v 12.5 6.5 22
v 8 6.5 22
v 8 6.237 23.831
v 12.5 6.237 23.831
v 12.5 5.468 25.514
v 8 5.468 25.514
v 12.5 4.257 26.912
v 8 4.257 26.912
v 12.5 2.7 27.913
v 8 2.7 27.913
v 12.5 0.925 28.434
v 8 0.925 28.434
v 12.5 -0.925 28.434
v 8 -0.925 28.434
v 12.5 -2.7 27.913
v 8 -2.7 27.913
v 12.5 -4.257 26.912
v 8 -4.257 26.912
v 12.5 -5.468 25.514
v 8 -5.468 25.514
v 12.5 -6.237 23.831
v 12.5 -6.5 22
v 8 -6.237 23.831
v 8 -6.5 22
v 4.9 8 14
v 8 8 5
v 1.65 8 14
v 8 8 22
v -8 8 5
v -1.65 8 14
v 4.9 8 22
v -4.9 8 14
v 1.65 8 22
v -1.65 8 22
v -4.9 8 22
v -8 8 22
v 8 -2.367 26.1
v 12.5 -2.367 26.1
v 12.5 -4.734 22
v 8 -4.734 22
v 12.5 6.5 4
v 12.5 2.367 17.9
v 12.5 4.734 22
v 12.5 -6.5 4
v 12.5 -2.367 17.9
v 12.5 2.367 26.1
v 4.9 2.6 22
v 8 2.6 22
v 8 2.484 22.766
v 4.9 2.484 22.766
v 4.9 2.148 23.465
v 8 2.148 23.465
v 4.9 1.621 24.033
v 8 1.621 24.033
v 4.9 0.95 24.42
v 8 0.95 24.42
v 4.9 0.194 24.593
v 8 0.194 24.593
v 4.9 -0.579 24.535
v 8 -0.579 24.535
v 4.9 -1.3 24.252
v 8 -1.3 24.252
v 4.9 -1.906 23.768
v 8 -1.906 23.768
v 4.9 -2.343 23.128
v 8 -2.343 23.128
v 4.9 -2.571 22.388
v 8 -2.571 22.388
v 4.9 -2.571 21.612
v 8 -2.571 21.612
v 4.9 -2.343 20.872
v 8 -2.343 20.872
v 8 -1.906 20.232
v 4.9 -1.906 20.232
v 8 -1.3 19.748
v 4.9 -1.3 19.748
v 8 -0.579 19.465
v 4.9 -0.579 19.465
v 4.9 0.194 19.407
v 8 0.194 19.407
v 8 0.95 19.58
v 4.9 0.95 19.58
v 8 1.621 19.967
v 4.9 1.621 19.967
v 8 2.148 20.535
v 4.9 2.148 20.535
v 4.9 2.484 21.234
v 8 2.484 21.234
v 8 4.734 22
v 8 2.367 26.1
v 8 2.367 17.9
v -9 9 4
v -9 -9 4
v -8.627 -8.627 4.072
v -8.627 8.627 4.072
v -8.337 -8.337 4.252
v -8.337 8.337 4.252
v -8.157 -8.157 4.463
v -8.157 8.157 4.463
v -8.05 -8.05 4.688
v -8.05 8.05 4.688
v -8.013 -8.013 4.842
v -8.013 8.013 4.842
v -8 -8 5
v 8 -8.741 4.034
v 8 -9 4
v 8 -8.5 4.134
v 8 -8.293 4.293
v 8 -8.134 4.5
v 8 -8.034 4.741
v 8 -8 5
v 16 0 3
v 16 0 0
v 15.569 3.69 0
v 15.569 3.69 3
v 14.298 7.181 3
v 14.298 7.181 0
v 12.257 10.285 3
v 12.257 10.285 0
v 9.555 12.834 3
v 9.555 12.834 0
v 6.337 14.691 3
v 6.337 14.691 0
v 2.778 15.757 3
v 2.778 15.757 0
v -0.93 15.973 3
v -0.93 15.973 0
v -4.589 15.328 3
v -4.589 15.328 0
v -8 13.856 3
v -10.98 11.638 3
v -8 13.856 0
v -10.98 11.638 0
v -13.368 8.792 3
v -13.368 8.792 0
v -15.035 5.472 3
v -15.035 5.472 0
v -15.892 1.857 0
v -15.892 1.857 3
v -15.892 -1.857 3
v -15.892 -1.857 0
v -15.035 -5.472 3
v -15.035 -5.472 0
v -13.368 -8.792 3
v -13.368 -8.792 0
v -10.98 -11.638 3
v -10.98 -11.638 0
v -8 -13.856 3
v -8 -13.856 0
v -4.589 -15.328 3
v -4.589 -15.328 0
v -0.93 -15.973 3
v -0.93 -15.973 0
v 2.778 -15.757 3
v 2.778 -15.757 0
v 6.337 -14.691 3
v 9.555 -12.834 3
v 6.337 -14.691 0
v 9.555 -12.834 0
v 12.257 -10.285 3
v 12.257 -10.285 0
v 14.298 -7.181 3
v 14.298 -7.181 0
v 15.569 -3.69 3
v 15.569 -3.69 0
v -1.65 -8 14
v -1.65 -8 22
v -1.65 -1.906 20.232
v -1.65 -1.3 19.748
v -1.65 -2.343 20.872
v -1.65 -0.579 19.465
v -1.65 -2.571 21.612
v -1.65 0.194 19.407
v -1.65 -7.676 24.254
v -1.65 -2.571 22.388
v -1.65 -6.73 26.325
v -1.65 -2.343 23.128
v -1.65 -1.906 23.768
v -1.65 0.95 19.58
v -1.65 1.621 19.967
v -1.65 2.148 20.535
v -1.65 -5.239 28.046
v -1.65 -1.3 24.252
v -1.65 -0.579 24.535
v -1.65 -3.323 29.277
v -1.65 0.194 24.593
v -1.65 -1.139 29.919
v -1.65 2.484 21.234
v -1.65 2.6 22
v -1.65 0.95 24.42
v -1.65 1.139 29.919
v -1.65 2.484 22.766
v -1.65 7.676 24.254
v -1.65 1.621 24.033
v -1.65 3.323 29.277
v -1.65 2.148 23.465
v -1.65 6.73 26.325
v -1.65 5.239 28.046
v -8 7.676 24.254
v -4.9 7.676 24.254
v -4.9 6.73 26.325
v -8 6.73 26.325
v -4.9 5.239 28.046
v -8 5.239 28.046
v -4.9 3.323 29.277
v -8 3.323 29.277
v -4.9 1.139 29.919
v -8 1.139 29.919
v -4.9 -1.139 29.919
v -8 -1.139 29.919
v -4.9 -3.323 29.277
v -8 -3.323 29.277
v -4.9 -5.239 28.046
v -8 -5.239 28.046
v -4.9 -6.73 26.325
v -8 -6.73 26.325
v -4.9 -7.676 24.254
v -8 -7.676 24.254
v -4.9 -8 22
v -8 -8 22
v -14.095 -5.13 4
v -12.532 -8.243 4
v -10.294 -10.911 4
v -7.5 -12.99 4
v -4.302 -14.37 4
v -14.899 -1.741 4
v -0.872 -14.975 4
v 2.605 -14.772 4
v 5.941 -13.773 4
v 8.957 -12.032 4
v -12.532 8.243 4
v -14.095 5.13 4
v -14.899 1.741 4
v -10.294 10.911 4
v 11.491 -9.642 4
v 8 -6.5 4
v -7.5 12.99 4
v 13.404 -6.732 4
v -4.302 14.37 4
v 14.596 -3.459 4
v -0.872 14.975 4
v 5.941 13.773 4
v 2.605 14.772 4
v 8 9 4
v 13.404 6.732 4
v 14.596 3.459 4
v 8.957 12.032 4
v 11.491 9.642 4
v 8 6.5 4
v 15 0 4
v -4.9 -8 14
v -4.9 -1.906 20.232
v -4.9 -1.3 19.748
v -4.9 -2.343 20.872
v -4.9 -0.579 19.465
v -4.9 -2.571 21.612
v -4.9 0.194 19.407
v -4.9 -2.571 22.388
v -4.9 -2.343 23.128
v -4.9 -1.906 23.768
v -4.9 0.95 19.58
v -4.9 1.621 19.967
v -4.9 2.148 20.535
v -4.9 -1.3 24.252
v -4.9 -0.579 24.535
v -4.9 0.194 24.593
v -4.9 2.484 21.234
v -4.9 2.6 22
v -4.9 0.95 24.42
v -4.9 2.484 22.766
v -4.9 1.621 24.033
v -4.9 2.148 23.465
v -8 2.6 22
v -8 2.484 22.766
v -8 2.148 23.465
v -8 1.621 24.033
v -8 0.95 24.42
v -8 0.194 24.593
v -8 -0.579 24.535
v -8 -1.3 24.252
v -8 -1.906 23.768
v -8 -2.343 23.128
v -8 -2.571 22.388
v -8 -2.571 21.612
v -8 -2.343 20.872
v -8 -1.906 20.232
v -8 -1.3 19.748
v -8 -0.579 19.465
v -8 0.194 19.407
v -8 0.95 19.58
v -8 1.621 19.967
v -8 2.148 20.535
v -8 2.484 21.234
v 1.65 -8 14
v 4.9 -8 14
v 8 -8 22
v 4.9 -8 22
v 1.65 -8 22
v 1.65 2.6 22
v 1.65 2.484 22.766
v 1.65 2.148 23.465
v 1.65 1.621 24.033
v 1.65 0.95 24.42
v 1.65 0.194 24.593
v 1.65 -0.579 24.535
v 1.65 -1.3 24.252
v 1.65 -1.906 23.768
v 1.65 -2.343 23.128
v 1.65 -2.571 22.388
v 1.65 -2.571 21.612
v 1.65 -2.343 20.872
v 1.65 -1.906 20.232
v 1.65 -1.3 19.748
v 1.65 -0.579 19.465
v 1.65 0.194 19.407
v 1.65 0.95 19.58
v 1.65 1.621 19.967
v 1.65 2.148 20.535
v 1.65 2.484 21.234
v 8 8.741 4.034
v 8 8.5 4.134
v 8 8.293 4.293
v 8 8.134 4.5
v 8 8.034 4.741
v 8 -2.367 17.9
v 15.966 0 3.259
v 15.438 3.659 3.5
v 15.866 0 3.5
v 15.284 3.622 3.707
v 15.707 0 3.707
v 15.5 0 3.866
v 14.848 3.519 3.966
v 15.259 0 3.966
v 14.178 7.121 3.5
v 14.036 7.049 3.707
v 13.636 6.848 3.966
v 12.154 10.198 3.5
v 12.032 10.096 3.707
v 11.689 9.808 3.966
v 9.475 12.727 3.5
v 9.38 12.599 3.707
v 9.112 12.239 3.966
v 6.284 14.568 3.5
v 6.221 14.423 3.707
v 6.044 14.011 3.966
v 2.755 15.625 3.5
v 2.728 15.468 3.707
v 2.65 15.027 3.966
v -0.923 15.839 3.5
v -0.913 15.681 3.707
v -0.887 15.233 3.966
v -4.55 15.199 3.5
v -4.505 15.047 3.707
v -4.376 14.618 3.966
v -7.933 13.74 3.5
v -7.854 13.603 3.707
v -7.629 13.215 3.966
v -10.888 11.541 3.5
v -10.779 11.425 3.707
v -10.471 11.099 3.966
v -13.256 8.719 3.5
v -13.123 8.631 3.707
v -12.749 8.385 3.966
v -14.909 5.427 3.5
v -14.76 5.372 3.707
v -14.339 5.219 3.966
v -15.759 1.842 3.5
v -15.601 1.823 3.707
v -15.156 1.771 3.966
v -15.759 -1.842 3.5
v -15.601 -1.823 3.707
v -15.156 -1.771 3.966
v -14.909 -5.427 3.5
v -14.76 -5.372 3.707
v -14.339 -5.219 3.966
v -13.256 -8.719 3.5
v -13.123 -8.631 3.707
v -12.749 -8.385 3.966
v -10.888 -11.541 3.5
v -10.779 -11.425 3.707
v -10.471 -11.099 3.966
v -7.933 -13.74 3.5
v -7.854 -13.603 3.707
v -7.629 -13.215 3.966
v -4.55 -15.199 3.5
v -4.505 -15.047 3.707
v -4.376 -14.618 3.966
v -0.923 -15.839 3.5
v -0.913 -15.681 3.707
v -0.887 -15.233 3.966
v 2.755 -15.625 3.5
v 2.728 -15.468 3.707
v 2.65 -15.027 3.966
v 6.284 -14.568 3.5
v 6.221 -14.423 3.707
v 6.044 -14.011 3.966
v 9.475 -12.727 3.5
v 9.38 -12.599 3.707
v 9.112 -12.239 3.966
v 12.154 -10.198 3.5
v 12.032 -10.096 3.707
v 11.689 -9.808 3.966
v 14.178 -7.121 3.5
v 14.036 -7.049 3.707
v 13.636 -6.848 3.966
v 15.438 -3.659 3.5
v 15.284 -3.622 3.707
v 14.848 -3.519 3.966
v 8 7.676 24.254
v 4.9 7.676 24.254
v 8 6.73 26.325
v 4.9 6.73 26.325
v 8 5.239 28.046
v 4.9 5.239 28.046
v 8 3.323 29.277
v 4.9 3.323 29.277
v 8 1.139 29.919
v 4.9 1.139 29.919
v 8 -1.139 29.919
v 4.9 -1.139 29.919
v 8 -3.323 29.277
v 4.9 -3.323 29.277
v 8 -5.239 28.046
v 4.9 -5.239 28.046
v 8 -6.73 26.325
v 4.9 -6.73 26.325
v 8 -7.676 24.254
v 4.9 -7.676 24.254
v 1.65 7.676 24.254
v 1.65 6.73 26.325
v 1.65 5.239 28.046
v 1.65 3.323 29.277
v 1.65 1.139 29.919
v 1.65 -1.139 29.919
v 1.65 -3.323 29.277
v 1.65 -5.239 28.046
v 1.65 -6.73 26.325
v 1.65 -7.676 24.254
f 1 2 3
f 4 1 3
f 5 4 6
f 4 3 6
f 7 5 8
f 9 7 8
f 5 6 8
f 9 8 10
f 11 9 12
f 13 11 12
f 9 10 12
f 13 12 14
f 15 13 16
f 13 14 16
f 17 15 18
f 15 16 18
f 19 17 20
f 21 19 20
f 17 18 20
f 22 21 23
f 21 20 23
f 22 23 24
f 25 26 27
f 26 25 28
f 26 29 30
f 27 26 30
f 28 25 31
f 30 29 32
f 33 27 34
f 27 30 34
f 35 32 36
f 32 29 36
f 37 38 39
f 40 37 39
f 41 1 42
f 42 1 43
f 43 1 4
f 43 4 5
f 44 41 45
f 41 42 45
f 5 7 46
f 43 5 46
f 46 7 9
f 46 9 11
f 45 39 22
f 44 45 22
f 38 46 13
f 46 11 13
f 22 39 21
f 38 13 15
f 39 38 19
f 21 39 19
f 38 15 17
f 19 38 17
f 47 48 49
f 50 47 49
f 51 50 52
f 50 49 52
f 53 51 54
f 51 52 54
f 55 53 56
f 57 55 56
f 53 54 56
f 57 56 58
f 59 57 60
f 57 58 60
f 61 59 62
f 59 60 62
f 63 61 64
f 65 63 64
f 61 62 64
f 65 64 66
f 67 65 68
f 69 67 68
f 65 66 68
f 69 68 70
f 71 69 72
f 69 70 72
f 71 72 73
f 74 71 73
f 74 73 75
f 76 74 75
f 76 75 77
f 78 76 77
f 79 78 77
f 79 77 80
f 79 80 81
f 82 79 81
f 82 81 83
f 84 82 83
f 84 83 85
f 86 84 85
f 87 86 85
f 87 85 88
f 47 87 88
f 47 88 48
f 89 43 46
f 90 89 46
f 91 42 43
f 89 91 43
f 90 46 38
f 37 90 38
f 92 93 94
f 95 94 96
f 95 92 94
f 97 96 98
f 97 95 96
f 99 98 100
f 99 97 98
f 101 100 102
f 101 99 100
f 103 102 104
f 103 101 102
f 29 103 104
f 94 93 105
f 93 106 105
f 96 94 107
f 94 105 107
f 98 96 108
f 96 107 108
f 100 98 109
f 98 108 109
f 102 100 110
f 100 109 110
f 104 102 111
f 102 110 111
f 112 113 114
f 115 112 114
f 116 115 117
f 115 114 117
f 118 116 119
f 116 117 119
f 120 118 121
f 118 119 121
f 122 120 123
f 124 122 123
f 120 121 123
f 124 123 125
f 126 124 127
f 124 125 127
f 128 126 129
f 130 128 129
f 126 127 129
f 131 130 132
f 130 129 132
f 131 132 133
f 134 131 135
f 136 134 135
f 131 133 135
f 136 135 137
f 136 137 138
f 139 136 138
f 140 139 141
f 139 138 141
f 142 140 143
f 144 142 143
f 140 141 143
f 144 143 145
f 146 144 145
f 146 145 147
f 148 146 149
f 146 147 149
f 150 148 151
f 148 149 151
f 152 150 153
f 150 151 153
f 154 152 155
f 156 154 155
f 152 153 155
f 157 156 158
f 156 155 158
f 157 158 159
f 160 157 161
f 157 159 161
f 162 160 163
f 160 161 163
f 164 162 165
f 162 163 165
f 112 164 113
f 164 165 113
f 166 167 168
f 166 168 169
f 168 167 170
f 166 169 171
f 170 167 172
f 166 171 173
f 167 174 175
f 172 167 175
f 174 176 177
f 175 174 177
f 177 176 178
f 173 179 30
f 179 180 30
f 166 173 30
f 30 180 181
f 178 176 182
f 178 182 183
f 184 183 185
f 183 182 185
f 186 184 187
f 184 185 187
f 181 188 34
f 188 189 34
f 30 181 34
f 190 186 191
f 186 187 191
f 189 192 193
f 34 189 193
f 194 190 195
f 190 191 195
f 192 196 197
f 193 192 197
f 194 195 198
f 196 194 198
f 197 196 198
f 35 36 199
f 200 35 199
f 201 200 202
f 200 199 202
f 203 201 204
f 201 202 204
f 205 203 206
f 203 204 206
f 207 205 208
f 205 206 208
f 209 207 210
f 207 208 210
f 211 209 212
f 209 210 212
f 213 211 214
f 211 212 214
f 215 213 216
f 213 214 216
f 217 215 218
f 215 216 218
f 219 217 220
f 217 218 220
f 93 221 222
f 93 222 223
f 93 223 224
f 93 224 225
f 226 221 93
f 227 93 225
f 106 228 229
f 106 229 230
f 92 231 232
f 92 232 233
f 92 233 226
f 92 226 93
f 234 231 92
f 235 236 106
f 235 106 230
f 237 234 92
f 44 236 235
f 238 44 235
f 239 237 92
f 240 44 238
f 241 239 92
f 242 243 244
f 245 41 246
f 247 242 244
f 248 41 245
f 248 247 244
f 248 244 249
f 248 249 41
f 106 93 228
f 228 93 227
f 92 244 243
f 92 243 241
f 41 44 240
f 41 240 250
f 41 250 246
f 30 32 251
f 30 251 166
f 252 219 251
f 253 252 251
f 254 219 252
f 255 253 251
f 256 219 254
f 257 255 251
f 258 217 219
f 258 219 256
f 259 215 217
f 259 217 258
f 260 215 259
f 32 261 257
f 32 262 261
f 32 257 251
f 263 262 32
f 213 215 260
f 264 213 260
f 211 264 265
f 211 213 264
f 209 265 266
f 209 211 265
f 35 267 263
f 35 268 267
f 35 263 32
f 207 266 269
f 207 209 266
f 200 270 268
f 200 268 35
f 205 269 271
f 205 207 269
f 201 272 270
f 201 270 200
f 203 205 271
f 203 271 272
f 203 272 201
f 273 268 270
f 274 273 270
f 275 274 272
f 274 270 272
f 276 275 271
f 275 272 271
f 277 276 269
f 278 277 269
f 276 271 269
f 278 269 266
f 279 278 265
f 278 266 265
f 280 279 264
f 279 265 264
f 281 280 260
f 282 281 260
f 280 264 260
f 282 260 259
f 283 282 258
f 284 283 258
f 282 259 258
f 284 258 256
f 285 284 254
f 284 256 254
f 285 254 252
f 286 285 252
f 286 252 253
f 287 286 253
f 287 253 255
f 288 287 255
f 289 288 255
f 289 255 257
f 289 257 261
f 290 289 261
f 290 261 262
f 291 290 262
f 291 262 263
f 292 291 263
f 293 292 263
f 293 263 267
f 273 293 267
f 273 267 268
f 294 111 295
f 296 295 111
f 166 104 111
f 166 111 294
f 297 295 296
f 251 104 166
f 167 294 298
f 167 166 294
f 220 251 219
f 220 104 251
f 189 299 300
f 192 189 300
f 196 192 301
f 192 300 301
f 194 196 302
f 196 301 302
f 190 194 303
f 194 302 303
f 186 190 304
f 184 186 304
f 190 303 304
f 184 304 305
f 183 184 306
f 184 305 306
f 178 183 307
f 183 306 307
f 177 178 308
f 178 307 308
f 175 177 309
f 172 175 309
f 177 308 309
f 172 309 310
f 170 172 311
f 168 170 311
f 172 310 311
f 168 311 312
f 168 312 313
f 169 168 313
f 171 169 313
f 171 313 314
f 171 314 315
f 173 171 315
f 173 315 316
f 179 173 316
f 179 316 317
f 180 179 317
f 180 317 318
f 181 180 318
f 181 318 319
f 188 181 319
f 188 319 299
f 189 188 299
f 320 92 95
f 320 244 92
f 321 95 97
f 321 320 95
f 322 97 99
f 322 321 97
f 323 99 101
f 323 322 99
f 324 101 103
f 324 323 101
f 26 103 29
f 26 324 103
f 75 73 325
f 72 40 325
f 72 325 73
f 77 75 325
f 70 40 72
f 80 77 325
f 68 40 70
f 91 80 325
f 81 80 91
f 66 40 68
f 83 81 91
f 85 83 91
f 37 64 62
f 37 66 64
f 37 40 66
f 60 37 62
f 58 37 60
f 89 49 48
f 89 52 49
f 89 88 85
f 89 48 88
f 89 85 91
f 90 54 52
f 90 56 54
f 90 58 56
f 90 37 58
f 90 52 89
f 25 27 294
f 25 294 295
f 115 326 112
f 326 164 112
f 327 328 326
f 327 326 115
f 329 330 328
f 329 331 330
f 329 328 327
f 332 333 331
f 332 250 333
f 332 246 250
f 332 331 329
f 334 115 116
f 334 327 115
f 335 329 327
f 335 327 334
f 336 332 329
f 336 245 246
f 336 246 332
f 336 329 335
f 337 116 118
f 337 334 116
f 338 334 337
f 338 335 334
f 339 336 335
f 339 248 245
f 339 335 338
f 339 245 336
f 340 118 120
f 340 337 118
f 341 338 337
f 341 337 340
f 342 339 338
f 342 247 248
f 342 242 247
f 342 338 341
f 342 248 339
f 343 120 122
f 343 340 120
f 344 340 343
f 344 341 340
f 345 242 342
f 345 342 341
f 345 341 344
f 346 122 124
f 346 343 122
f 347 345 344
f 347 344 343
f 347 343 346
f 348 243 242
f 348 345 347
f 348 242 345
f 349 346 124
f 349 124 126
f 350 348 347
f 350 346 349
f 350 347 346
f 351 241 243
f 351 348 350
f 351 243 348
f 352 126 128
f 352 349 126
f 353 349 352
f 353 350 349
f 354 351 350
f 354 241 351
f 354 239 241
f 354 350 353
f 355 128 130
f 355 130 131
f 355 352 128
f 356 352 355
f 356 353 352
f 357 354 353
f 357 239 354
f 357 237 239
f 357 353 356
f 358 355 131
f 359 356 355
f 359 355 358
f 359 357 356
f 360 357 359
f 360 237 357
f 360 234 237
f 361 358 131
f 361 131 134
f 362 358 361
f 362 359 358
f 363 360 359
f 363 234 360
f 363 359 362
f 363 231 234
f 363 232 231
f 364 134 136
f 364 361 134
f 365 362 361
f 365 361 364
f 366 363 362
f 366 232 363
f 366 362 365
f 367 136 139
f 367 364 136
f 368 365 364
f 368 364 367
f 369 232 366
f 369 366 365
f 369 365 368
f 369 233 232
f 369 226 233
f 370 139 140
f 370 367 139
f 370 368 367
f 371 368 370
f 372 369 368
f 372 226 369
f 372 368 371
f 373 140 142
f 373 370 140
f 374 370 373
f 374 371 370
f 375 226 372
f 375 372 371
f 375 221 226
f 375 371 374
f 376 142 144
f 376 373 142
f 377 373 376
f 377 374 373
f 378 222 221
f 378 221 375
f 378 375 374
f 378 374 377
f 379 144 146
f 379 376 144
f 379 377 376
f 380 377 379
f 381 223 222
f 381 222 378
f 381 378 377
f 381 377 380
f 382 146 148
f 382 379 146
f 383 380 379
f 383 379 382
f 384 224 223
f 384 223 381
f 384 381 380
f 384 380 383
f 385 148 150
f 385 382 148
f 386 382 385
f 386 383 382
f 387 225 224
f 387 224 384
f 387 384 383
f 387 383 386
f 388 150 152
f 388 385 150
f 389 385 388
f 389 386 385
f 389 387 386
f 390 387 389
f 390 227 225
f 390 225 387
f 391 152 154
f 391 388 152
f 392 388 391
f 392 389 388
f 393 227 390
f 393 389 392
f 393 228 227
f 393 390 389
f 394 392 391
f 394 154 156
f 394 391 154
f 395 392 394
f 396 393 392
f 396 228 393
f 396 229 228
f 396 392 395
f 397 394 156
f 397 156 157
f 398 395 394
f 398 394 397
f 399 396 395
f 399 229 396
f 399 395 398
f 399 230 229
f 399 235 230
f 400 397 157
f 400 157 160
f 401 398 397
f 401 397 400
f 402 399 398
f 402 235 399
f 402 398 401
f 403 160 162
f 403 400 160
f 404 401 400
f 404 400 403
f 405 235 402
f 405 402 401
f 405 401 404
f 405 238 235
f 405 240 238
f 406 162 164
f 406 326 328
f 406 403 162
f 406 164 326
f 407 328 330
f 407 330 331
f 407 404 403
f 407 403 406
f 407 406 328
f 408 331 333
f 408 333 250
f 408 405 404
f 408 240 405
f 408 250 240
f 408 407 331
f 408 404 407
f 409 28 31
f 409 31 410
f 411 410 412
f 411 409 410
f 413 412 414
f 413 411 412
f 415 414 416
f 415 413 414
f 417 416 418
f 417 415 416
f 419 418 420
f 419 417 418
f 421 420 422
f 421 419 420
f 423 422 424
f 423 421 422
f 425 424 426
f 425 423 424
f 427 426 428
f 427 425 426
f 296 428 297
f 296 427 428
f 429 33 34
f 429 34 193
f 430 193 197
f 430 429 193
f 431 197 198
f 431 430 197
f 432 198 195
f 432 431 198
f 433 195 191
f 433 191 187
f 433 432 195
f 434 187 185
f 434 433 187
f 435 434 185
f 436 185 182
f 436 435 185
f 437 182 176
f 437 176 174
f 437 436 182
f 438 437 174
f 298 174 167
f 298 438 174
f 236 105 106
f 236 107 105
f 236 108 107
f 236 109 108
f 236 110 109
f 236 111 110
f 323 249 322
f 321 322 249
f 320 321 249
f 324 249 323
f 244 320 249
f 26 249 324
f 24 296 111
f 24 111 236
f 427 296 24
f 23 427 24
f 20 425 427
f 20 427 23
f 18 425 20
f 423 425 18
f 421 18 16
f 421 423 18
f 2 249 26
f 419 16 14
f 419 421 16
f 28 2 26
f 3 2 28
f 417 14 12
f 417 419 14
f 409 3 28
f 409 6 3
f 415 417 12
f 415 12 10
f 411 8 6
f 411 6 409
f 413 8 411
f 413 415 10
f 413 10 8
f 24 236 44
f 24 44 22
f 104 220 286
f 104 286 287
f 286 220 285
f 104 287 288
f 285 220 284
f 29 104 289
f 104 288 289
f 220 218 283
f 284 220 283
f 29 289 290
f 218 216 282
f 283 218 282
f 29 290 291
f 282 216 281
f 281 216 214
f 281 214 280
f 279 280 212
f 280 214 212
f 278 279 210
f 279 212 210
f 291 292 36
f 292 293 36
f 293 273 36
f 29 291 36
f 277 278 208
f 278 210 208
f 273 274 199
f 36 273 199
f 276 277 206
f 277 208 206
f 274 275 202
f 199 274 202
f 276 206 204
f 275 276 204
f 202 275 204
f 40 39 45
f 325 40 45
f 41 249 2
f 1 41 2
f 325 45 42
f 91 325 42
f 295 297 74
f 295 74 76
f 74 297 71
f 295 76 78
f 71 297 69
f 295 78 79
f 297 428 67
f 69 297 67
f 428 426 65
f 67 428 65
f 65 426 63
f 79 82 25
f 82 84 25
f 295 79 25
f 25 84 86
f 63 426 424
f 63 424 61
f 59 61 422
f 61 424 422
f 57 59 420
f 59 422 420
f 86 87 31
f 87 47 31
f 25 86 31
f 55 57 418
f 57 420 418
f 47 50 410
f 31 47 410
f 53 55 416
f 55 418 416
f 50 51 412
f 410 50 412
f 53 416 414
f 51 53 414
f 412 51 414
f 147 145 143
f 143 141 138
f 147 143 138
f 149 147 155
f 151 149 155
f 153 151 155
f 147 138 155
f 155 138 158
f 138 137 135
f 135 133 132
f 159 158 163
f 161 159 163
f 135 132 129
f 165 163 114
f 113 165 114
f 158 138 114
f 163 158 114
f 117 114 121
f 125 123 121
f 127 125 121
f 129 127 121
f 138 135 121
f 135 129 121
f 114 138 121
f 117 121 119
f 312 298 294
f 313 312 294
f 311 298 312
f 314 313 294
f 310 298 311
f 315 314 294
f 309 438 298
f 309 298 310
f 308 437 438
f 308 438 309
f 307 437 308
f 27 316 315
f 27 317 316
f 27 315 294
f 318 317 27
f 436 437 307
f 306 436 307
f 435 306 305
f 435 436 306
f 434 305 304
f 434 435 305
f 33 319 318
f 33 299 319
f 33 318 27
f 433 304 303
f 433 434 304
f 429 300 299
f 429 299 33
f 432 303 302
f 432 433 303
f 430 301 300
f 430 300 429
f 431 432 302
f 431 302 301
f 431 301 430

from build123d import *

# Parameters (mm, degrees)
SKETCH_R        = 16
PAD_DEPTH       = 4
FILLET_R        = 1
SKETCH001_W     = 16
SKETCH001_H     = 16
PAD001_DEPTH    = 10
FILLET001_R     = 1
PAD002_DEPTH    = 3.1
PAD003_DEPTH    = 1.65
SKETCH004_R     = 2.6
POCKET_DEPTH    = 24.001
PAD004_DEPTH    = 4.5
POCKET001_DEPTH = 4.5


with BuildPart() as part:
    # Sketch → Pad (new body)
    with BuildSketch(Plane.XY):
        Circle(SKETCH_R)
    extrude(amount=PAD_DEPTH)

    # Fillet
    fillet_edges = [part.edges().sort_by_distance(p)[0] for p in [
        (-16, 0, 4),
    ]]
    fillet(fillet_edges, radius=FILLET_R)

    # Sketch001 (on Face4 of Fillet) → Pad001 (join)
    with BuildSketch(Plane.XY.offset(4)):
        Rectangle(SKETCH001_W, SKETCH001_H)
    extrude(amount=PAD001_DEPTH)

    # Fillet001
    fillet001_edges = [part.edges().sort_by_distance(p)[0] for p in [
        (0, -8, 4),
        (0, 8, 4),
        (-8, 0, 4),
    ]]
    fillet(fillet001_edges, radius=FILLET001_R)

    # Sketch002 (on Face2 of Fillet001) → Pad002 (join)
    with BuildSketch(Plane.YZ.offset(8)):
        with BuildLine():
            Line((-8, 14), (8, 14))
            Line((8, 14), (8, 22))
            ThreePointArc((8, 22), (0, 30), (-8, 22))
            Line((-8, 14), (-8, 22))
        make_face()
    pad002 = extrude(amount=-PAD002_DEPTH)

    # Mirrored: Pad002 across YZ
    add(pad002.mirror(Plane.YZ))

    # Sketch003 → Pad003 (join, symmetric)
    with BuildSketch(Plane.YZ):
        with BuildLine():
            Line((-8, 14), (8, 14))
            Line((8, 14), (8, 22))
            ThreePointArc((8, 22), (0, 30), (-8, 22))
            Line((-8, 14), (-8, 22))
        make_face()
    extrude(amount=PAD003_DEPTH, both=True)

    # Sketch004 (on Face8 of Pad003) → Pocket (cut, through all)
    with BuildSketch(Plane.YZ.offset(8)):
        with Locations((0, 22)):
            Circle(SKETCH004_R)
    extrude(amount=-POCKET_DEPTH, mode=Mode.SUBTRACT)

    # Sketch005 (on Face8 of Pocket) → Pad004 (join)
    with BuildSketch(Plane.YZ.offset(8)):
        with BuildLine():
            Line((-6.5, 4), (-6.5, 22))
            ThreePointArc((6.5, 22), (0, 28.5), (-6.5, 22))
            Line((6.5, 4), (6.5, 22))
            Line((-6.5, 4), (6.5, 4))
        make_face()
    extrude(amount=PAD004_DEPTH)

    # Sketch006 (on Face5 of Pad004) → Pocket001 (cut)
    with BuildSketch(Plane.YZ.offset(12.5)):
        Polygon((2.367136, 26.1), (-2.367136, 26.1), (-4.734272, 22), (-2.367136, 17.9), (2.367136, 17.9), (4.734272, 22), align=None)
    extrude(amount=-POCKET001_DEPTH, mode=Mode.SUBTRACT)


solid = part.part
